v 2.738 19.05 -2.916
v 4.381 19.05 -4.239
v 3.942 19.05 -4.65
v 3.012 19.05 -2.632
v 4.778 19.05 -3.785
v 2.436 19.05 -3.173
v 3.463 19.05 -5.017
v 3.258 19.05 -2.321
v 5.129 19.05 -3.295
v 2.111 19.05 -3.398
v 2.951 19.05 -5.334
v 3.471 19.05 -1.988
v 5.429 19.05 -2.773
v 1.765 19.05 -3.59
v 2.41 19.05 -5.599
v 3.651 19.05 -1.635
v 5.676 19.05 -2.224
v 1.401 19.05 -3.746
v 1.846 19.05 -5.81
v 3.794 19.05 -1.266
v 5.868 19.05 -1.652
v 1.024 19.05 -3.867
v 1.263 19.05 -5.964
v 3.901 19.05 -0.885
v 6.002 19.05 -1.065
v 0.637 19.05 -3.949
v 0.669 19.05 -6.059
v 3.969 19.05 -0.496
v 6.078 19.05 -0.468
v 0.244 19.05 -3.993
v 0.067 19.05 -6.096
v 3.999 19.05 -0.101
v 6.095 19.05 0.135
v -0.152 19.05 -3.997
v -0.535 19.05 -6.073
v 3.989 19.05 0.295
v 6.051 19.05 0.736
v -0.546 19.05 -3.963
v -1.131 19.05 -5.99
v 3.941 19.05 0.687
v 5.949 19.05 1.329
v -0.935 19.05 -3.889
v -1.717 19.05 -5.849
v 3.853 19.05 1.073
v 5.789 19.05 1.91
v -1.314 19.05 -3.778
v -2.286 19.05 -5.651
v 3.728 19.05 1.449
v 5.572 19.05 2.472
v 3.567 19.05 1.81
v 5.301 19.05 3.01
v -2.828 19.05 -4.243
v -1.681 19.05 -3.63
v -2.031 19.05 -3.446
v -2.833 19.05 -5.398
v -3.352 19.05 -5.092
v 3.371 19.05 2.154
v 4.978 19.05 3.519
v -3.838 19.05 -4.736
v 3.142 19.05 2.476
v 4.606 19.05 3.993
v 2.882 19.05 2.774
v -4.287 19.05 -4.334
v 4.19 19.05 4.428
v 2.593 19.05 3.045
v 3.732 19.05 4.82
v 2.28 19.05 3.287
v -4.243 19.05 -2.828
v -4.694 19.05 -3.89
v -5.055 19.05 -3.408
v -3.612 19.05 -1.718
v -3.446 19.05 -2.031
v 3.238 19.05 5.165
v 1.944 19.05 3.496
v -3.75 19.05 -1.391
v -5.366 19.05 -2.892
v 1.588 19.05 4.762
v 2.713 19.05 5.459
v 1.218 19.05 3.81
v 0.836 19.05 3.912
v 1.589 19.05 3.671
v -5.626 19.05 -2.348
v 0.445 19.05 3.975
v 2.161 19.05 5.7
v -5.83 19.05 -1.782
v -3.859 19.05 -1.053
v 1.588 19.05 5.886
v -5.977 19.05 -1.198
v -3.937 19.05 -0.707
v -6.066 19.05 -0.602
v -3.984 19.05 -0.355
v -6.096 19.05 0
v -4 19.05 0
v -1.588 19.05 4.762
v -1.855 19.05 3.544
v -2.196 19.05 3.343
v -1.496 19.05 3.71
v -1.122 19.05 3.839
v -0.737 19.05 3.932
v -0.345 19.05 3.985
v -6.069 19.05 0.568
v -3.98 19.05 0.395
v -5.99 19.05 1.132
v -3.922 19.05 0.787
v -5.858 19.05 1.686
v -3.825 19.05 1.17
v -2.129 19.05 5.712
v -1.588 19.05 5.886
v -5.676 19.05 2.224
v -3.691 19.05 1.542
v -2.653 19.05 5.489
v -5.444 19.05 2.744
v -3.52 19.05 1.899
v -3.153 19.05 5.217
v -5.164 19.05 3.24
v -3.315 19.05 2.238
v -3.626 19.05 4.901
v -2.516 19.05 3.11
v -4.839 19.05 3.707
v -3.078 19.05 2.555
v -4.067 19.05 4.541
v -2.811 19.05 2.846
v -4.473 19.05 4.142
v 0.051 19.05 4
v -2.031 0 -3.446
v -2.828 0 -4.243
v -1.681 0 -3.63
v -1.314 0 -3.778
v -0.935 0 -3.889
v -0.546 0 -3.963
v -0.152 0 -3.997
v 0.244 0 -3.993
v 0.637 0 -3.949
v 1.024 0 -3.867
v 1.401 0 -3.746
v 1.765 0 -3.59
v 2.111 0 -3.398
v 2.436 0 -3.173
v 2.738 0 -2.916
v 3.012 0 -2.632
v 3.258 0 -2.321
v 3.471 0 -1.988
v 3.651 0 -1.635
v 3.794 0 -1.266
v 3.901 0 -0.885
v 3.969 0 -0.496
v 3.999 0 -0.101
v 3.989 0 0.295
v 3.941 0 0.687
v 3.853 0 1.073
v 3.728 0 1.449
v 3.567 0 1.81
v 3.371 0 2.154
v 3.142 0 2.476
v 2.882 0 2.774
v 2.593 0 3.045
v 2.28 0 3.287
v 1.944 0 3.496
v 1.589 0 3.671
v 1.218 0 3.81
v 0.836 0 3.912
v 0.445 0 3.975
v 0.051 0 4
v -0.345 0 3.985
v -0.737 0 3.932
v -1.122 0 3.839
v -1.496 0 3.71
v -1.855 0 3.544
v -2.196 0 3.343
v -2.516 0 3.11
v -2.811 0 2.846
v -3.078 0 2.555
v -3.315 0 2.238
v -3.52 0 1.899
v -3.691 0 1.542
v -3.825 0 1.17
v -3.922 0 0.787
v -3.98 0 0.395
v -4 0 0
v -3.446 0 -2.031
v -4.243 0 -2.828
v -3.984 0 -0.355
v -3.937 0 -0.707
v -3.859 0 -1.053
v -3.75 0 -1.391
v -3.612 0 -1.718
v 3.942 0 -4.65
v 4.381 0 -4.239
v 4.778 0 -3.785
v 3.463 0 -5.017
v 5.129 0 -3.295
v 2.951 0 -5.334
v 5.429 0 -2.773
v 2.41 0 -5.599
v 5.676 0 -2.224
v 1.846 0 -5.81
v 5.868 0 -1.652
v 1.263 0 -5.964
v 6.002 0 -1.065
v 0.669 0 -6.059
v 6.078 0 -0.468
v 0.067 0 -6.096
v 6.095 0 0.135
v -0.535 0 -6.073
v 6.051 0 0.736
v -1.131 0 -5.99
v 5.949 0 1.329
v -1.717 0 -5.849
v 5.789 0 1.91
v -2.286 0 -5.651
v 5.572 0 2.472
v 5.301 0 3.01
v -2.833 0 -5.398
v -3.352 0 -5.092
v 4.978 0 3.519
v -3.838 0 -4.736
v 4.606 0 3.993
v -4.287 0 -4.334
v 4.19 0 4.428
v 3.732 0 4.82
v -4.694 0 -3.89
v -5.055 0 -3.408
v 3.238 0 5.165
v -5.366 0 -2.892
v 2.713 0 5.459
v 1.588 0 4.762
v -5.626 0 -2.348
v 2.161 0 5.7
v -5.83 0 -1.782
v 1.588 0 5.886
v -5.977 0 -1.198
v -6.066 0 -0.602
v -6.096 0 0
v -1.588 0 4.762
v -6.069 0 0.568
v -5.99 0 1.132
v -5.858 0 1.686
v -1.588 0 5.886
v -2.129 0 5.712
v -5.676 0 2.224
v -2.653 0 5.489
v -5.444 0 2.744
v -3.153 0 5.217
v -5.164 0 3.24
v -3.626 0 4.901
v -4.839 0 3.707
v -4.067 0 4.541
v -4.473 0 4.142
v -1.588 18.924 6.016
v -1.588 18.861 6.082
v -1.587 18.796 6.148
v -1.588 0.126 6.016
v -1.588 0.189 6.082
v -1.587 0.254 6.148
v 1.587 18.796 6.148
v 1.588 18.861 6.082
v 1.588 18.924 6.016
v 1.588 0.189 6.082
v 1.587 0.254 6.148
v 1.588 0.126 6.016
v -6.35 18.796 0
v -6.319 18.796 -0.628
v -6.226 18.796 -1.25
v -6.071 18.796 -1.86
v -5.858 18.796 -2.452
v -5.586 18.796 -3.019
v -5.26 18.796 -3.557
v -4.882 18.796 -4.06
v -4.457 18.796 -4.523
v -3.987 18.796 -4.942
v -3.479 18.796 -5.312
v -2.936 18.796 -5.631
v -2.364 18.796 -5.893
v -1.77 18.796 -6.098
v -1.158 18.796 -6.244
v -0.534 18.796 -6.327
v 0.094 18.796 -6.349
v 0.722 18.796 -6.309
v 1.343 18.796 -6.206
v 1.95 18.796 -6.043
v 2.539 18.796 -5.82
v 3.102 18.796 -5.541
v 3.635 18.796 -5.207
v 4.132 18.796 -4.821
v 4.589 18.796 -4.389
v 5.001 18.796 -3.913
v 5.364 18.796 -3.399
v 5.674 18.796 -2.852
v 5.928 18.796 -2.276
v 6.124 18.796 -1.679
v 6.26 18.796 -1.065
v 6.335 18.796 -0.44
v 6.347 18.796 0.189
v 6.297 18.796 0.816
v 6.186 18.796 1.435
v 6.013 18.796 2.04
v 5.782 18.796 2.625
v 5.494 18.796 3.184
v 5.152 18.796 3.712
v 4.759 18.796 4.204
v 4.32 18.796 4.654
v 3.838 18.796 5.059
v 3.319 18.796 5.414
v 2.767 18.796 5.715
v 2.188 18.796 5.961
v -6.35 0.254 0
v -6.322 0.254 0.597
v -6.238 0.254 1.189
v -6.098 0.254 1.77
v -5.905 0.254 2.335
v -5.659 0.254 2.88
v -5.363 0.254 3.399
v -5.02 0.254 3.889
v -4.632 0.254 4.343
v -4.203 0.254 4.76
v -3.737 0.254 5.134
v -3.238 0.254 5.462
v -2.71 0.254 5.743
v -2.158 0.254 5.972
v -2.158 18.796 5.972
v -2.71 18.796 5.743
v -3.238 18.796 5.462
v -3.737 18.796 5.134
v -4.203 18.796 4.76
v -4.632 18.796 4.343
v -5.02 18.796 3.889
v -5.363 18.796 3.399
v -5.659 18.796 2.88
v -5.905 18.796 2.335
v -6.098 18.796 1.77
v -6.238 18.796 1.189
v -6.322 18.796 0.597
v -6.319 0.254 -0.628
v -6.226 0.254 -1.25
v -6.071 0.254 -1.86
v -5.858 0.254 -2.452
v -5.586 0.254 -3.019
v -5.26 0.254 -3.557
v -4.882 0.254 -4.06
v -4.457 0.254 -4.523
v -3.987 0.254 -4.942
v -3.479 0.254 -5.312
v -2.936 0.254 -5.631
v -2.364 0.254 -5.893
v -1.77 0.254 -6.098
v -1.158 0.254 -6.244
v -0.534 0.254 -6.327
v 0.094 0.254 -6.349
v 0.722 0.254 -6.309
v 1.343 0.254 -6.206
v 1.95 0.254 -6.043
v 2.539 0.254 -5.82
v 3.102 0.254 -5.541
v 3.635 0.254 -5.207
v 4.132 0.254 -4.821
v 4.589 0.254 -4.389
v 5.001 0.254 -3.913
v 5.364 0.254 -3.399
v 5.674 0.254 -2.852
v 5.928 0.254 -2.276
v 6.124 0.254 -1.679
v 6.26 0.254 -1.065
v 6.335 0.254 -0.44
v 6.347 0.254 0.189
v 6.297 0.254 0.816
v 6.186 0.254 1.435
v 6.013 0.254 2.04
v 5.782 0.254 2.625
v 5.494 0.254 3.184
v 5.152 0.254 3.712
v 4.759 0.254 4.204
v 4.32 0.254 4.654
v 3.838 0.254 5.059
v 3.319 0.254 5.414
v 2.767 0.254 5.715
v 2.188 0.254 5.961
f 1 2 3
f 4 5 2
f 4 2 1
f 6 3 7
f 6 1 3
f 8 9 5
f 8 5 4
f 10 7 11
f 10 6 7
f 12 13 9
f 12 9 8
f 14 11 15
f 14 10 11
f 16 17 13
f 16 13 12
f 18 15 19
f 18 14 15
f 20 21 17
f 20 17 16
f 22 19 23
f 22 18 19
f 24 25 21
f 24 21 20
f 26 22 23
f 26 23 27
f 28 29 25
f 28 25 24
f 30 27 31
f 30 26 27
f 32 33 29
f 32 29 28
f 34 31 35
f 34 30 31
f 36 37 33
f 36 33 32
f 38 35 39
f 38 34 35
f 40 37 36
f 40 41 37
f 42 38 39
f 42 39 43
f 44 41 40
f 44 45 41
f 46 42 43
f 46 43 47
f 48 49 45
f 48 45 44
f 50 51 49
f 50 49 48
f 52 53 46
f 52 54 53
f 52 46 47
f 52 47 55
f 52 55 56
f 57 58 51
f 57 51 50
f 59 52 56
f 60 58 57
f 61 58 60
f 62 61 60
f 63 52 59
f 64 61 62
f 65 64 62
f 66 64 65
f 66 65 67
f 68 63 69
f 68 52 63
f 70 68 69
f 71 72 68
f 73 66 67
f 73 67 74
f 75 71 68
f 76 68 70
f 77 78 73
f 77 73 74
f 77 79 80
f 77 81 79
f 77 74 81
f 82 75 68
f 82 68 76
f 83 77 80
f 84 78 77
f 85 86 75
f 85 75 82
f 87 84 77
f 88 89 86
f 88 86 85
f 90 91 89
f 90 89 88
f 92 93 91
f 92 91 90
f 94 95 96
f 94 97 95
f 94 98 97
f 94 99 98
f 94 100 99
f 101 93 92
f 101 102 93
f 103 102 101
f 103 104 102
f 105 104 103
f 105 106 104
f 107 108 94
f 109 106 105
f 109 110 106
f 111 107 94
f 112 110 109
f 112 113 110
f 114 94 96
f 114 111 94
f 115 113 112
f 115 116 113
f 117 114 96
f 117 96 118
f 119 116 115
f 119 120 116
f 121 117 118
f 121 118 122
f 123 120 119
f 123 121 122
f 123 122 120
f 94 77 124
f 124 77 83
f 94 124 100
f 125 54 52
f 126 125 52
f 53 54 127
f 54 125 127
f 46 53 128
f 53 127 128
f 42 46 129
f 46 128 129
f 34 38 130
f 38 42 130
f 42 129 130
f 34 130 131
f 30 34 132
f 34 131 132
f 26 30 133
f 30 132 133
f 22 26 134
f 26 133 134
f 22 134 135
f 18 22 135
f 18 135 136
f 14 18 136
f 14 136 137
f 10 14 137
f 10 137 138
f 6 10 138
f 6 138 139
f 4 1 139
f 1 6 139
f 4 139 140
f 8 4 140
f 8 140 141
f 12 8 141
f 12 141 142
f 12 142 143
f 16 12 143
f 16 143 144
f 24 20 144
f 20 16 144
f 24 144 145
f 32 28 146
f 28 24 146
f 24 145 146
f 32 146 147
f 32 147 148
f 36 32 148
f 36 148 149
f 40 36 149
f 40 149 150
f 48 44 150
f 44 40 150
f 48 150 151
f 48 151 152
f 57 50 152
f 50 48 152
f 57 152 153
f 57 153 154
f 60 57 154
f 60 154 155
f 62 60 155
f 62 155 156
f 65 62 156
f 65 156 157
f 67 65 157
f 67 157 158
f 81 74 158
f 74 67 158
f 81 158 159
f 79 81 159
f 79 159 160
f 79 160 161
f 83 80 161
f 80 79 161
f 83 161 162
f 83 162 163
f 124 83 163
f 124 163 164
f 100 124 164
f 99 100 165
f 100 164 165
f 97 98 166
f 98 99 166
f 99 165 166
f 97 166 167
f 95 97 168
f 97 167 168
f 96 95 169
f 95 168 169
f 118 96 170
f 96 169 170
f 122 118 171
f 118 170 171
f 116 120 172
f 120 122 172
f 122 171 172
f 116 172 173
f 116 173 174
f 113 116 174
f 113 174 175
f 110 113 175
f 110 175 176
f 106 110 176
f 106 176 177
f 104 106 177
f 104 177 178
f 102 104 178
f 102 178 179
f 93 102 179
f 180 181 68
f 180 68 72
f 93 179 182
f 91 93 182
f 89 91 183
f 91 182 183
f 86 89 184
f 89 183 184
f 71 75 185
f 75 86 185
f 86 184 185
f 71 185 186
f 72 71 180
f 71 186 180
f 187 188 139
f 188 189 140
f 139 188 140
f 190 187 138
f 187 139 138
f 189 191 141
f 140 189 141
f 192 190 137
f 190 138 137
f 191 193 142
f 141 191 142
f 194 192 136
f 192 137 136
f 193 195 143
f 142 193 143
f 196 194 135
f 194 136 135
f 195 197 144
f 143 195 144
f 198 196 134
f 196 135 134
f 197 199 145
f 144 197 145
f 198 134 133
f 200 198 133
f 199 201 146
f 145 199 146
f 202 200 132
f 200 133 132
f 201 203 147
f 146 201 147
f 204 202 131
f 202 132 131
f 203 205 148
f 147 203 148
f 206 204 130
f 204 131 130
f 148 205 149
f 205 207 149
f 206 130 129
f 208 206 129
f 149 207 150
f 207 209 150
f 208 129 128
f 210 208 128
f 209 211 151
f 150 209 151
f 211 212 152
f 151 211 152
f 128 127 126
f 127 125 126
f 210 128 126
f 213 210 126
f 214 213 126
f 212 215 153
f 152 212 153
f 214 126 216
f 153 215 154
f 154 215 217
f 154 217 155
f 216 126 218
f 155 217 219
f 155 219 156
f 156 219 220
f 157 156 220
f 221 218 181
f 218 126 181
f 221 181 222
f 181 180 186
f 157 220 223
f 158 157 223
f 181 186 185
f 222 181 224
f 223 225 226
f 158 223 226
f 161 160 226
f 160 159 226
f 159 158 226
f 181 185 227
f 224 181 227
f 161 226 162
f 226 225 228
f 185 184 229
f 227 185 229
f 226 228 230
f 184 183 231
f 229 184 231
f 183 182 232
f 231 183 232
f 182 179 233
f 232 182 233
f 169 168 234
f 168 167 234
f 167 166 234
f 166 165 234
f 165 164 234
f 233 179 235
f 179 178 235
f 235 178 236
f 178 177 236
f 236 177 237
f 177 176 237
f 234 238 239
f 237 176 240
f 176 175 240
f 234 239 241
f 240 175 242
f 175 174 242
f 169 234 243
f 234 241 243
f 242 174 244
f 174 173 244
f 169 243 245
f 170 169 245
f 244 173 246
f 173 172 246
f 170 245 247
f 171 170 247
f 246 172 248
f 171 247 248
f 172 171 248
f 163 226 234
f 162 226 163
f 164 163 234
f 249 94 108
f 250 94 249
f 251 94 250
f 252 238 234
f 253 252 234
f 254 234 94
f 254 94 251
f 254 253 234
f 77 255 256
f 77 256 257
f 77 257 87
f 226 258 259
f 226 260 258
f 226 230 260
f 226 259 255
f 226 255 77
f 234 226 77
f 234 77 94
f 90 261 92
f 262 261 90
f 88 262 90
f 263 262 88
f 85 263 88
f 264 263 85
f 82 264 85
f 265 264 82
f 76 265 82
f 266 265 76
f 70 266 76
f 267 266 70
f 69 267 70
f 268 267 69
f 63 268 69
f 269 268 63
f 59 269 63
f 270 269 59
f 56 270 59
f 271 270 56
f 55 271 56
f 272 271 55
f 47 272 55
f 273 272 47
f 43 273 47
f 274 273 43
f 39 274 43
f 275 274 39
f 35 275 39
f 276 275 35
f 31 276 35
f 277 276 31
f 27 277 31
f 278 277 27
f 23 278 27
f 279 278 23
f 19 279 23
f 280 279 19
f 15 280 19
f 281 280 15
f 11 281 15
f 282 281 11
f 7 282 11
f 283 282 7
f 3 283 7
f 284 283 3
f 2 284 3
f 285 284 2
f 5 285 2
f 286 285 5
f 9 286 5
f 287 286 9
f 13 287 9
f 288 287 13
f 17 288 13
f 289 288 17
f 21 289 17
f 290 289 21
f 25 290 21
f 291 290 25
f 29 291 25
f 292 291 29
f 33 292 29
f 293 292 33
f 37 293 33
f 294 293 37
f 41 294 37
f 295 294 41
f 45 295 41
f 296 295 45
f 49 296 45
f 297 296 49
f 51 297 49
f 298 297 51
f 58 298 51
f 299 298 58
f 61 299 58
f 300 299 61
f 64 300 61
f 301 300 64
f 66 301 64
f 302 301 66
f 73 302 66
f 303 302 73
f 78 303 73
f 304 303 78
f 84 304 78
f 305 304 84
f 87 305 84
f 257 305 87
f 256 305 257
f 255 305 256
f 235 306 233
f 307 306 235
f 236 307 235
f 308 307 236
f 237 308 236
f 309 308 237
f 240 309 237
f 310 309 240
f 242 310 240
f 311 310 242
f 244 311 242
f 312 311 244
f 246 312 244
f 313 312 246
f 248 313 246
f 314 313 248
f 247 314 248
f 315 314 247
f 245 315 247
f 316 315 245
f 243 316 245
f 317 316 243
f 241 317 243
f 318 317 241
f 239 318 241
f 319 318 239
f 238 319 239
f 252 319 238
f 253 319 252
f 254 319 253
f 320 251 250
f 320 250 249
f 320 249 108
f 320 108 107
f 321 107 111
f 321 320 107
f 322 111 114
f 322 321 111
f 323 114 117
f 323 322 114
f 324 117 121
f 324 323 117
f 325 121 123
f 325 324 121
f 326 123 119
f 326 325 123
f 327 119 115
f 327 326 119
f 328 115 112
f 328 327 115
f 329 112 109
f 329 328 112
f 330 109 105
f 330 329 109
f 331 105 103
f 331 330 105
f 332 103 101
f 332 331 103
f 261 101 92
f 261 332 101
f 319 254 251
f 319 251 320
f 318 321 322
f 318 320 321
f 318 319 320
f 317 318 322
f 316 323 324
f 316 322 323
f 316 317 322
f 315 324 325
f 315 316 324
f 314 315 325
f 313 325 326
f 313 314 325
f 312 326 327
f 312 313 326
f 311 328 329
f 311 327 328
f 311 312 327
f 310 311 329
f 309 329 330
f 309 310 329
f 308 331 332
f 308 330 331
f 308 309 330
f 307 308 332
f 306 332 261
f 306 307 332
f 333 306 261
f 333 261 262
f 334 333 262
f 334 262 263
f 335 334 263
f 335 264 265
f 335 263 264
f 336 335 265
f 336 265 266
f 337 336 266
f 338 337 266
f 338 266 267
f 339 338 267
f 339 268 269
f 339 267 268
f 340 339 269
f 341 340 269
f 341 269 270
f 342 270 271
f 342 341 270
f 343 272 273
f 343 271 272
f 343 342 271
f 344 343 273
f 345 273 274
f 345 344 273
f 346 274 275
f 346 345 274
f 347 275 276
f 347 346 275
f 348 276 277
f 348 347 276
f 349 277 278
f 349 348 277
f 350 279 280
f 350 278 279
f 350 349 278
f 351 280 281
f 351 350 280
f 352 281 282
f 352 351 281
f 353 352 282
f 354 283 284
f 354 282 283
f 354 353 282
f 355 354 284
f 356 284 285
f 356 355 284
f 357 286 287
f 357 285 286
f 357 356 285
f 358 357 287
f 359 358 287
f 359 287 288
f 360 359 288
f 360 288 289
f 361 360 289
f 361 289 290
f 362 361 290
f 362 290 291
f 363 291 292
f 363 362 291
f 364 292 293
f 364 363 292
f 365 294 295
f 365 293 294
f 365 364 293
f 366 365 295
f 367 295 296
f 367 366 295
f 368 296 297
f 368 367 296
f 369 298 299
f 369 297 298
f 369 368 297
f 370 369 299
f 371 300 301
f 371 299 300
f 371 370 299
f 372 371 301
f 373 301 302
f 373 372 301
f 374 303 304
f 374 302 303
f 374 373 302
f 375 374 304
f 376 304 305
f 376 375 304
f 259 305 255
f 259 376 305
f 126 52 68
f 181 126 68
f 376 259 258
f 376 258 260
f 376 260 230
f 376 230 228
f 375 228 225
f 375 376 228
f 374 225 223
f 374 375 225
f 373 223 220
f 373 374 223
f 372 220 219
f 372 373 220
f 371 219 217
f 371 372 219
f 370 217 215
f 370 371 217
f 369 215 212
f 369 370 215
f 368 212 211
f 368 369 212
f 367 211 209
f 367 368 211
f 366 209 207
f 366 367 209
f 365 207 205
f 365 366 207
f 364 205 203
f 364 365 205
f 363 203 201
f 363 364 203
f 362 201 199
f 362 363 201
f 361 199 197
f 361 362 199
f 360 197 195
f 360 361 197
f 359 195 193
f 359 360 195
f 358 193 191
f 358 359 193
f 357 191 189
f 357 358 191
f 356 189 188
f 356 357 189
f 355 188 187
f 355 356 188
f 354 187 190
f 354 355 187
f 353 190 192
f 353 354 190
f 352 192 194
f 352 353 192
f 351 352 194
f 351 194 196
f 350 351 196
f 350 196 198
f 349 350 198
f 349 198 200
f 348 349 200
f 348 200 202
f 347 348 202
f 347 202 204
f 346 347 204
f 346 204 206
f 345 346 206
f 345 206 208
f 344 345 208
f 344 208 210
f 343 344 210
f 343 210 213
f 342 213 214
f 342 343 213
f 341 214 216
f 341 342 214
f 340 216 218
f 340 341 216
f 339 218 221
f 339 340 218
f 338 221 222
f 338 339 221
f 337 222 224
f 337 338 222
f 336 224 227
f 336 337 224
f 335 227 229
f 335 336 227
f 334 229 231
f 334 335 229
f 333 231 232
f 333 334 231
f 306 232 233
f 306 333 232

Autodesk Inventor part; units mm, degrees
ref_plane "YZ Plane" through (0, 0, 0) normal (1, 0, 0) x (0, 1, 0)
ref_plane "XZ Plane" through (0, 0, 0) normal (0, 1, 0) x (-1, 0, 0)
ref_plane "XY Plane" through (0, 0, 0) normal (0, 0, 1) x (1, 0, 0)
sketch "Sketch1" plane through (0, 0, 0) normal (0, 1, 0) x (-1, 0, 0)
  circle A0 centre (0, 0) radius 6.35
  circle A1 centre (0, 0) radius 4
  line L0 (-1.5875, 6.1484) -> (-1.5875, 4.7625)
  line L1 (-1.5875, 4.7625) -> (1.5875, 4.7625)
  line L2 (1.5875, 4.7625) -> (1.5875, 6.1484)
  line L3 (0, 6.35) -> (0, 0) construction
  line L4 (0, 0) -> (4.4901, -4.4901) construction
  line L5 (0, 0) -> (6.35, 0) construction
  line L6 (2.0315, -3.4457) -> (2.8284, -4.2426)
  line L7 (2.8284, -4.2426) -> (4.2426, -2.8284)
  line L8 (4.2426, -2.8284) -> (3.4457, -2.0315)
  line L9 (2.8284, -2.8284) -> (3.5355, -3.5355) construction
  point P0 (0, 4.7625)
  dimension "d0" = 12.7
  dimension "d1" = 8
  dimension "d4" = 3.175
  dimension "d5" = 45
  dimension "d6" = 2
  dimension "d8" = 1.5875
  dimension "d9" = 1
extrude "Extrusion1" add sketch "Sketch1" along normal blind 19.05 contours A0 L0 L1 L2 picked at (1.2402, -5.3906)
chamfer "Chamfer1" distance 0.254 angle 45 2 edges at (0, 19.05, -6.35) (0, 0, -6.35)
properties part number "0.5 inch Shaft to 8mm Shaft Insert" material "Aluminum 6061"
